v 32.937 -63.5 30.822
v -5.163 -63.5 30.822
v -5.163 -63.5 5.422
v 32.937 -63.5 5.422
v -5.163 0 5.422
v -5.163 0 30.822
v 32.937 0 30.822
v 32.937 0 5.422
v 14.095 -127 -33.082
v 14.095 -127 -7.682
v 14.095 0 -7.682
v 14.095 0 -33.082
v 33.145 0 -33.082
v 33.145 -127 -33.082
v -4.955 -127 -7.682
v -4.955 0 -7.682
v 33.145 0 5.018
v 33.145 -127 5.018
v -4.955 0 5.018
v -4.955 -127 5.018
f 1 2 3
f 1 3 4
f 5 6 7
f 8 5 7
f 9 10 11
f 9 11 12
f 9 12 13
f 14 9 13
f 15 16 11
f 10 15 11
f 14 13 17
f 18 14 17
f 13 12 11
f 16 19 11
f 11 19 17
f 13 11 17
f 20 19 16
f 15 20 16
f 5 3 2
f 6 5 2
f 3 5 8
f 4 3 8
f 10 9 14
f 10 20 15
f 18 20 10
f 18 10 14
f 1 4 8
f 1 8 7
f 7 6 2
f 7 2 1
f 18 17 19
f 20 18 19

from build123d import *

# Parameters (mm, degrees)
F1_DEPTH = 127
F2_W     = 38.1
F2_H     = 25.4
F3_DEPTH = 33.274
F4_DEPTH = 63.5


with BuildPart() as f1:
    # F0 (on Front) → F1 (new body)
    with BuildSketch(Plane.XZ):
        Polygon((14.094918, -7.682459), (14.094918, -33.082459), (33.144918, -33.082459), (33.144918, 5.017541), (-4.955082, 5.017541), (-4.955082, -7.682459), align=None)
    extrude(amount=F1_DEPTH)


with BuildPart() as f3:
    # F2 (on Front) → F3 (new body)
    with BuildSketch(Plane.XZ):
        with Locations((13.886722, 18.121922)):
            Rectangle(F2_W, F2_H)
    extrude(amount=F3_DEPTH)

    # F2 (on Front) → F4 (join)
    with BuildSketch(Plane.XZ):
        with Locations((13.886722, 18.121922)):
            Rectangle(F2_W, F2_H)
    extrude(amount=F4_DEPTH)


solid = Compound([f1.part, f3.part])
